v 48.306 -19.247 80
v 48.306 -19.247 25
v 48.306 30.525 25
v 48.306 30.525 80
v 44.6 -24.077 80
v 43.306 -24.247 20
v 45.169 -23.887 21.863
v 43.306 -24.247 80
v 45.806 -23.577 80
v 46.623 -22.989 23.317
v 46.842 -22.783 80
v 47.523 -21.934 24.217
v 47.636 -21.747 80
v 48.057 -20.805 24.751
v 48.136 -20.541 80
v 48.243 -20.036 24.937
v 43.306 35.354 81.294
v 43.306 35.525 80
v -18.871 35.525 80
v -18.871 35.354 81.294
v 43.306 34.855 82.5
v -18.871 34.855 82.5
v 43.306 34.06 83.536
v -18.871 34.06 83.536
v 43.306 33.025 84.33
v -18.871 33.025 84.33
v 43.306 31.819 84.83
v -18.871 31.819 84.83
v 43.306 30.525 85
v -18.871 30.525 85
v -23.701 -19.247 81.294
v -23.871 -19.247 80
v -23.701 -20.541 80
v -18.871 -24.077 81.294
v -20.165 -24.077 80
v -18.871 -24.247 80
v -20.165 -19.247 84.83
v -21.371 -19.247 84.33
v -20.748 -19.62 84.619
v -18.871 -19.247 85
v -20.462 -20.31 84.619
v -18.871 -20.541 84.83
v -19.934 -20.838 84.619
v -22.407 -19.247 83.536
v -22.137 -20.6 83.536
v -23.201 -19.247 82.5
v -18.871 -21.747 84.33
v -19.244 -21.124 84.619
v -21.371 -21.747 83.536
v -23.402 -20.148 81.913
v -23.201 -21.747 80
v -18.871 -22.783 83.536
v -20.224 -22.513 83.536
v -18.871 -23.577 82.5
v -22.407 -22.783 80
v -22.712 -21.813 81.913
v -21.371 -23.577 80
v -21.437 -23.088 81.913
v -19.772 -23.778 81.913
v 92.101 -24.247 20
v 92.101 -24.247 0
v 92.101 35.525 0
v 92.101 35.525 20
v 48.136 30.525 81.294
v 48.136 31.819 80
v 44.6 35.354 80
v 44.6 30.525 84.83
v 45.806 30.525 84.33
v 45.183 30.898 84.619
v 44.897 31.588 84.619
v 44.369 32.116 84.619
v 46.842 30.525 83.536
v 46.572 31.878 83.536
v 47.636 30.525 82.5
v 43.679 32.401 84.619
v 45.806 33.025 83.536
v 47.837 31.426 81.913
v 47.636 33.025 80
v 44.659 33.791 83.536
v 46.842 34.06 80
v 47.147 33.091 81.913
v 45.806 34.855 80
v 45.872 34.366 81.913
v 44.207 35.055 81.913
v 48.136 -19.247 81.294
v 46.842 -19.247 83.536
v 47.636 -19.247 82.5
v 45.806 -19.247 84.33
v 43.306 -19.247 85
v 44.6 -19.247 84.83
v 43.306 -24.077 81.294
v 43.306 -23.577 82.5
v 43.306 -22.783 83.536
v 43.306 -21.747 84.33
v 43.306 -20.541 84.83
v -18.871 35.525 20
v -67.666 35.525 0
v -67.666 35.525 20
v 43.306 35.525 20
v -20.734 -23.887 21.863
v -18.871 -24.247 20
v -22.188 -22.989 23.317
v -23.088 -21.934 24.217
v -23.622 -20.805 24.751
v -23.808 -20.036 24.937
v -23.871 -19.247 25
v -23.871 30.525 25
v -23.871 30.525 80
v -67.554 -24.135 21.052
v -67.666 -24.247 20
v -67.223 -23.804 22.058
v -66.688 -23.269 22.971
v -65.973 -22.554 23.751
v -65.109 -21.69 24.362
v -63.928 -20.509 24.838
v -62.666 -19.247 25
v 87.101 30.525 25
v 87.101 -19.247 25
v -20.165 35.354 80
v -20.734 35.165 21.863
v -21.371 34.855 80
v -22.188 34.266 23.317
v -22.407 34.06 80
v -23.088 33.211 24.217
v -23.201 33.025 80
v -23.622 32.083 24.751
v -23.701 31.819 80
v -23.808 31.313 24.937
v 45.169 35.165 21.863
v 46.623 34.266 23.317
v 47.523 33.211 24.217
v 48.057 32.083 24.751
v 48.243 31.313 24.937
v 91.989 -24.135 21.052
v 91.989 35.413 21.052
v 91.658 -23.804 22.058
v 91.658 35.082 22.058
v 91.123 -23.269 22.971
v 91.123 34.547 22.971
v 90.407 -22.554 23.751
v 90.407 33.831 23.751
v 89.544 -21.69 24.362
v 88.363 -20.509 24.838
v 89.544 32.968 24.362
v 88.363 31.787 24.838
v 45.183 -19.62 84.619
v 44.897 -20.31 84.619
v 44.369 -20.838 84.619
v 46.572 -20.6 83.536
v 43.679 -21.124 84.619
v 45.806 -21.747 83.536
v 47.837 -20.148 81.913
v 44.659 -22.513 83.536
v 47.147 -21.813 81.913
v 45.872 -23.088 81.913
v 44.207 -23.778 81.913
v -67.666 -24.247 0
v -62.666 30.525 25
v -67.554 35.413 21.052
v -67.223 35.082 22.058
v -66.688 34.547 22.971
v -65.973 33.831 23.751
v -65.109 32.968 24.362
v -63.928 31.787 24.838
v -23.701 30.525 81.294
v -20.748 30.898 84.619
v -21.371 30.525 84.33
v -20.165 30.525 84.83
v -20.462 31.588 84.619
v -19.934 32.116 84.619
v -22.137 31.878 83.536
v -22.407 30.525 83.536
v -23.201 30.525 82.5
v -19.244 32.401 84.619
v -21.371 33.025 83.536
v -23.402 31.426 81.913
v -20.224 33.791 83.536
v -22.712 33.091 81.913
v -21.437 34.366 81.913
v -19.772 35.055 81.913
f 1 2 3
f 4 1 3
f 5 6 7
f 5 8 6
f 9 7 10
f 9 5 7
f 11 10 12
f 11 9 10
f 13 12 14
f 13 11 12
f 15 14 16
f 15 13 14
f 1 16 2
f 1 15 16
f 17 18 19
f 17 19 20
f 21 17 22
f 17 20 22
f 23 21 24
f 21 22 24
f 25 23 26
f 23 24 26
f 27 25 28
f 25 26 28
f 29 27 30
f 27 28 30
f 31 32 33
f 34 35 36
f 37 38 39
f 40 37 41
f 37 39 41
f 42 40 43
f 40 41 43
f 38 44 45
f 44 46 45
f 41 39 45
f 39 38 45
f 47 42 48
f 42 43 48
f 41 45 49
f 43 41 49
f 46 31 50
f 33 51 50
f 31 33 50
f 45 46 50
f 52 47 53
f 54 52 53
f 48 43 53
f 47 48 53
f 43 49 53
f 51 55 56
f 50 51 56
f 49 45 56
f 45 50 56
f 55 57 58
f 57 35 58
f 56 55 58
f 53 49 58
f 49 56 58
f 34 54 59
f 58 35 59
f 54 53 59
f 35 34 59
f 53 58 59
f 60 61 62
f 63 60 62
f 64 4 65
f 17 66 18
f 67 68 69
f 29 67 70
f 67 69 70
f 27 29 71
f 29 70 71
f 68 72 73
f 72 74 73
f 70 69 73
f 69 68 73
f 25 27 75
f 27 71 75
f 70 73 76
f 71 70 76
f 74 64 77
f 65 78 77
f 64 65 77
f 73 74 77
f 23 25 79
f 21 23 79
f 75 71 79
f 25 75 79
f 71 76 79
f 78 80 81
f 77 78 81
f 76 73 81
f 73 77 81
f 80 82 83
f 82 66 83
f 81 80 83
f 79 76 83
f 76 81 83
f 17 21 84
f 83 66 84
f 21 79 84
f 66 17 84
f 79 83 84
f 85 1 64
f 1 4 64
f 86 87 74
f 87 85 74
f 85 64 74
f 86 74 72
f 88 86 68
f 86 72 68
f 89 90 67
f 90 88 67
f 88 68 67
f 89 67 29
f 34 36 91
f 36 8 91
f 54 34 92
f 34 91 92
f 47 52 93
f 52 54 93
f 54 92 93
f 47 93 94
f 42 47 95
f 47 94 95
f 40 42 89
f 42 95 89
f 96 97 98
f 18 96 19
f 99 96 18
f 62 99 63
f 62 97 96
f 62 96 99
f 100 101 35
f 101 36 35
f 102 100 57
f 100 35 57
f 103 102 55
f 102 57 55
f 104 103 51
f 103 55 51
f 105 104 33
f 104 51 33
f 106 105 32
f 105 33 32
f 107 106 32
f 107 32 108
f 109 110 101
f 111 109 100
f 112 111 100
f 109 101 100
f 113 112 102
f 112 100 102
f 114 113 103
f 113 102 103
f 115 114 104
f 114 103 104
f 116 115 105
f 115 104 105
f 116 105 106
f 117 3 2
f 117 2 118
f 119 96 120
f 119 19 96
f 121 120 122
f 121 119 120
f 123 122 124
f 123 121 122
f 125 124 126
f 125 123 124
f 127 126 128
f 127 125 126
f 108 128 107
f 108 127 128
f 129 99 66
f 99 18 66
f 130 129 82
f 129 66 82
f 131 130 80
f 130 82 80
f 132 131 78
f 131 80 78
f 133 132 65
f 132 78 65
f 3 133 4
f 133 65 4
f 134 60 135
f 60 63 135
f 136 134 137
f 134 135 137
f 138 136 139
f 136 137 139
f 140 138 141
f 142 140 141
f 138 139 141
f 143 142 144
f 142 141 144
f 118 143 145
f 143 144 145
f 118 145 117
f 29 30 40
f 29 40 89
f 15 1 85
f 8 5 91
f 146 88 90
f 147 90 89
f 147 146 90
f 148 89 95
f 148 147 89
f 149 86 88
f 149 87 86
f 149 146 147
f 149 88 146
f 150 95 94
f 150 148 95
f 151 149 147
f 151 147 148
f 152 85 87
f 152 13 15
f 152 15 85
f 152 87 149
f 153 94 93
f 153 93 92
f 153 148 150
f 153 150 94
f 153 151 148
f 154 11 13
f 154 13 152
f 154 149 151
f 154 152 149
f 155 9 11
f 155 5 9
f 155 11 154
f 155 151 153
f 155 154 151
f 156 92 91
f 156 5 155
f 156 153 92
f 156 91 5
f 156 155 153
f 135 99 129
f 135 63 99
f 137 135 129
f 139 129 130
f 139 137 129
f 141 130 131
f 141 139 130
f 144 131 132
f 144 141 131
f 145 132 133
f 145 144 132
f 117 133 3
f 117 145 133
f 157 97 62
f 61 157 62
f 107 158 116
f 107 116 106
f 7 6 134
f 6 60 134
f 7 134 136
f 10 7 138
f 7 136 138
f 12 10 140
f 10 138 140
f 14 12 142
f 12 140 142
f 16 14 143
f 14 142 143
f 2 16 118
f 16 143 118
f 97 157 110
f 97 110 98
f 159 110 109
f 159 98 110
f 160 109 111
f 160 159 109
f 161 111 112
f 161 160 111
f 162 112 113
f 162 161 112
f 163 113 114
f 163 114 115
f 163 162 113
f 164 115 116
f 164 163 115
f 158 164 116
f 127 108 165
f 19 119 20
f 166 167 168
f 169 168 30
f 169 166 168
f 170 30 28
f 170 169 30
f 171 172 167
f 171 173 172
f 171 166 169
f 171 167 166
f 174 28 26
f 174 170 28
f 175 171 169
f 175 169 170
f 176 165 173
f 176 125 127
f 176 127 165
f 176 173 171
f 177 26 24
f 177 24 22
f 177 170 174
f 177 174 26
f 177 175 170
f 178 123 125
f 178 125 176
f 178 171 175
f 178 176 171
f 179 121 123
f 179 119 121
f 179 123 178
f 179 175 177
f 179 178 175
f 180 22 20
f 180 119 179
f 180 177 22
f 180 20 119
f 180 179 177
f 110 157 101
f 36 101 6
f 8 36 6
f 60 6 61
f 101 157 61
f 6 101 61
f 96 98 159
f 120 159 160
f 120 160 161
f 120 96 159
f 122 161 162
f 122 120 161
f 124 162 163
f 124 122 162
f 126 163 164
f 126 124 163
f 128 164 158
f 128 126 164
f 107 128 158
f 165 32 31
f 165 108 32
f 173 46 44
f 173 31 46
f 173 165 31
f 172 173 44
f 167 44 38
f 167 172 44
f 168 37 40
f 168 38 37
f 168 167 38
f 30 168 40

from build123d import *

# Parameters (mm, degrees)
F0_W     = 159.7669422626
F0_H     = 59.7716327757
F1_DEPTH = 25
F2_W     = 36.0885336995
F2_H     = 59.7716327757
F2_W_2   = 36.0885262489
F3_DEPTH = 60
F4_R     = 5


with BuildPart() as f1:
    # F0 (on Top) → F1 (new body)
    with BuildSketch(Plane.XY):
        with Locations((12.2174695134, 5.6388350204)):
            Rectangle(F0_W, F0_H)
    extrude(amount=F1_DEPTH)

    # F2 (on face) → F3 (join)
    with BuildSketch(Plane.XY.offset(25)):
        with Locations((-5.8267973363, 5.6388350204)):
            Rectangle(F2_W, F2_H)
        with Locations((30.2617326379, 5.6388350204)):
            Rectangle(F2_W_2, F2_H)
    extrude(amount=F3_DEPTH)

    # F4
    f4_edges = [f1.edges().sort_by_distance(p)[0] for p in [
        (-23.871064, -24.246981, 55),
        (-23.871064, 35.524651, 55),
        (48.305996, -24.246981, 55),
        (-45.768533, -24.246981, 25),
        (-45.768533, 35.524651, 25),
        (70.203468, -24.246981, 25),
        (70.203468, 35.524651, 25),
        (48.305996, 35.524651, 55),
        (-67.666002, 5.638835, 25),
        (92.100941, 5.638835, 25),
        (48.305996, 5.638835, 85),
        (-23.871064, 5.638835, 85),
        (12.217466, 35.524651, 85),
        (12.217466, -24.246981, 85),
    ]]
    fillet(f4_edges, radius=F4_R)


solid = f1.part
